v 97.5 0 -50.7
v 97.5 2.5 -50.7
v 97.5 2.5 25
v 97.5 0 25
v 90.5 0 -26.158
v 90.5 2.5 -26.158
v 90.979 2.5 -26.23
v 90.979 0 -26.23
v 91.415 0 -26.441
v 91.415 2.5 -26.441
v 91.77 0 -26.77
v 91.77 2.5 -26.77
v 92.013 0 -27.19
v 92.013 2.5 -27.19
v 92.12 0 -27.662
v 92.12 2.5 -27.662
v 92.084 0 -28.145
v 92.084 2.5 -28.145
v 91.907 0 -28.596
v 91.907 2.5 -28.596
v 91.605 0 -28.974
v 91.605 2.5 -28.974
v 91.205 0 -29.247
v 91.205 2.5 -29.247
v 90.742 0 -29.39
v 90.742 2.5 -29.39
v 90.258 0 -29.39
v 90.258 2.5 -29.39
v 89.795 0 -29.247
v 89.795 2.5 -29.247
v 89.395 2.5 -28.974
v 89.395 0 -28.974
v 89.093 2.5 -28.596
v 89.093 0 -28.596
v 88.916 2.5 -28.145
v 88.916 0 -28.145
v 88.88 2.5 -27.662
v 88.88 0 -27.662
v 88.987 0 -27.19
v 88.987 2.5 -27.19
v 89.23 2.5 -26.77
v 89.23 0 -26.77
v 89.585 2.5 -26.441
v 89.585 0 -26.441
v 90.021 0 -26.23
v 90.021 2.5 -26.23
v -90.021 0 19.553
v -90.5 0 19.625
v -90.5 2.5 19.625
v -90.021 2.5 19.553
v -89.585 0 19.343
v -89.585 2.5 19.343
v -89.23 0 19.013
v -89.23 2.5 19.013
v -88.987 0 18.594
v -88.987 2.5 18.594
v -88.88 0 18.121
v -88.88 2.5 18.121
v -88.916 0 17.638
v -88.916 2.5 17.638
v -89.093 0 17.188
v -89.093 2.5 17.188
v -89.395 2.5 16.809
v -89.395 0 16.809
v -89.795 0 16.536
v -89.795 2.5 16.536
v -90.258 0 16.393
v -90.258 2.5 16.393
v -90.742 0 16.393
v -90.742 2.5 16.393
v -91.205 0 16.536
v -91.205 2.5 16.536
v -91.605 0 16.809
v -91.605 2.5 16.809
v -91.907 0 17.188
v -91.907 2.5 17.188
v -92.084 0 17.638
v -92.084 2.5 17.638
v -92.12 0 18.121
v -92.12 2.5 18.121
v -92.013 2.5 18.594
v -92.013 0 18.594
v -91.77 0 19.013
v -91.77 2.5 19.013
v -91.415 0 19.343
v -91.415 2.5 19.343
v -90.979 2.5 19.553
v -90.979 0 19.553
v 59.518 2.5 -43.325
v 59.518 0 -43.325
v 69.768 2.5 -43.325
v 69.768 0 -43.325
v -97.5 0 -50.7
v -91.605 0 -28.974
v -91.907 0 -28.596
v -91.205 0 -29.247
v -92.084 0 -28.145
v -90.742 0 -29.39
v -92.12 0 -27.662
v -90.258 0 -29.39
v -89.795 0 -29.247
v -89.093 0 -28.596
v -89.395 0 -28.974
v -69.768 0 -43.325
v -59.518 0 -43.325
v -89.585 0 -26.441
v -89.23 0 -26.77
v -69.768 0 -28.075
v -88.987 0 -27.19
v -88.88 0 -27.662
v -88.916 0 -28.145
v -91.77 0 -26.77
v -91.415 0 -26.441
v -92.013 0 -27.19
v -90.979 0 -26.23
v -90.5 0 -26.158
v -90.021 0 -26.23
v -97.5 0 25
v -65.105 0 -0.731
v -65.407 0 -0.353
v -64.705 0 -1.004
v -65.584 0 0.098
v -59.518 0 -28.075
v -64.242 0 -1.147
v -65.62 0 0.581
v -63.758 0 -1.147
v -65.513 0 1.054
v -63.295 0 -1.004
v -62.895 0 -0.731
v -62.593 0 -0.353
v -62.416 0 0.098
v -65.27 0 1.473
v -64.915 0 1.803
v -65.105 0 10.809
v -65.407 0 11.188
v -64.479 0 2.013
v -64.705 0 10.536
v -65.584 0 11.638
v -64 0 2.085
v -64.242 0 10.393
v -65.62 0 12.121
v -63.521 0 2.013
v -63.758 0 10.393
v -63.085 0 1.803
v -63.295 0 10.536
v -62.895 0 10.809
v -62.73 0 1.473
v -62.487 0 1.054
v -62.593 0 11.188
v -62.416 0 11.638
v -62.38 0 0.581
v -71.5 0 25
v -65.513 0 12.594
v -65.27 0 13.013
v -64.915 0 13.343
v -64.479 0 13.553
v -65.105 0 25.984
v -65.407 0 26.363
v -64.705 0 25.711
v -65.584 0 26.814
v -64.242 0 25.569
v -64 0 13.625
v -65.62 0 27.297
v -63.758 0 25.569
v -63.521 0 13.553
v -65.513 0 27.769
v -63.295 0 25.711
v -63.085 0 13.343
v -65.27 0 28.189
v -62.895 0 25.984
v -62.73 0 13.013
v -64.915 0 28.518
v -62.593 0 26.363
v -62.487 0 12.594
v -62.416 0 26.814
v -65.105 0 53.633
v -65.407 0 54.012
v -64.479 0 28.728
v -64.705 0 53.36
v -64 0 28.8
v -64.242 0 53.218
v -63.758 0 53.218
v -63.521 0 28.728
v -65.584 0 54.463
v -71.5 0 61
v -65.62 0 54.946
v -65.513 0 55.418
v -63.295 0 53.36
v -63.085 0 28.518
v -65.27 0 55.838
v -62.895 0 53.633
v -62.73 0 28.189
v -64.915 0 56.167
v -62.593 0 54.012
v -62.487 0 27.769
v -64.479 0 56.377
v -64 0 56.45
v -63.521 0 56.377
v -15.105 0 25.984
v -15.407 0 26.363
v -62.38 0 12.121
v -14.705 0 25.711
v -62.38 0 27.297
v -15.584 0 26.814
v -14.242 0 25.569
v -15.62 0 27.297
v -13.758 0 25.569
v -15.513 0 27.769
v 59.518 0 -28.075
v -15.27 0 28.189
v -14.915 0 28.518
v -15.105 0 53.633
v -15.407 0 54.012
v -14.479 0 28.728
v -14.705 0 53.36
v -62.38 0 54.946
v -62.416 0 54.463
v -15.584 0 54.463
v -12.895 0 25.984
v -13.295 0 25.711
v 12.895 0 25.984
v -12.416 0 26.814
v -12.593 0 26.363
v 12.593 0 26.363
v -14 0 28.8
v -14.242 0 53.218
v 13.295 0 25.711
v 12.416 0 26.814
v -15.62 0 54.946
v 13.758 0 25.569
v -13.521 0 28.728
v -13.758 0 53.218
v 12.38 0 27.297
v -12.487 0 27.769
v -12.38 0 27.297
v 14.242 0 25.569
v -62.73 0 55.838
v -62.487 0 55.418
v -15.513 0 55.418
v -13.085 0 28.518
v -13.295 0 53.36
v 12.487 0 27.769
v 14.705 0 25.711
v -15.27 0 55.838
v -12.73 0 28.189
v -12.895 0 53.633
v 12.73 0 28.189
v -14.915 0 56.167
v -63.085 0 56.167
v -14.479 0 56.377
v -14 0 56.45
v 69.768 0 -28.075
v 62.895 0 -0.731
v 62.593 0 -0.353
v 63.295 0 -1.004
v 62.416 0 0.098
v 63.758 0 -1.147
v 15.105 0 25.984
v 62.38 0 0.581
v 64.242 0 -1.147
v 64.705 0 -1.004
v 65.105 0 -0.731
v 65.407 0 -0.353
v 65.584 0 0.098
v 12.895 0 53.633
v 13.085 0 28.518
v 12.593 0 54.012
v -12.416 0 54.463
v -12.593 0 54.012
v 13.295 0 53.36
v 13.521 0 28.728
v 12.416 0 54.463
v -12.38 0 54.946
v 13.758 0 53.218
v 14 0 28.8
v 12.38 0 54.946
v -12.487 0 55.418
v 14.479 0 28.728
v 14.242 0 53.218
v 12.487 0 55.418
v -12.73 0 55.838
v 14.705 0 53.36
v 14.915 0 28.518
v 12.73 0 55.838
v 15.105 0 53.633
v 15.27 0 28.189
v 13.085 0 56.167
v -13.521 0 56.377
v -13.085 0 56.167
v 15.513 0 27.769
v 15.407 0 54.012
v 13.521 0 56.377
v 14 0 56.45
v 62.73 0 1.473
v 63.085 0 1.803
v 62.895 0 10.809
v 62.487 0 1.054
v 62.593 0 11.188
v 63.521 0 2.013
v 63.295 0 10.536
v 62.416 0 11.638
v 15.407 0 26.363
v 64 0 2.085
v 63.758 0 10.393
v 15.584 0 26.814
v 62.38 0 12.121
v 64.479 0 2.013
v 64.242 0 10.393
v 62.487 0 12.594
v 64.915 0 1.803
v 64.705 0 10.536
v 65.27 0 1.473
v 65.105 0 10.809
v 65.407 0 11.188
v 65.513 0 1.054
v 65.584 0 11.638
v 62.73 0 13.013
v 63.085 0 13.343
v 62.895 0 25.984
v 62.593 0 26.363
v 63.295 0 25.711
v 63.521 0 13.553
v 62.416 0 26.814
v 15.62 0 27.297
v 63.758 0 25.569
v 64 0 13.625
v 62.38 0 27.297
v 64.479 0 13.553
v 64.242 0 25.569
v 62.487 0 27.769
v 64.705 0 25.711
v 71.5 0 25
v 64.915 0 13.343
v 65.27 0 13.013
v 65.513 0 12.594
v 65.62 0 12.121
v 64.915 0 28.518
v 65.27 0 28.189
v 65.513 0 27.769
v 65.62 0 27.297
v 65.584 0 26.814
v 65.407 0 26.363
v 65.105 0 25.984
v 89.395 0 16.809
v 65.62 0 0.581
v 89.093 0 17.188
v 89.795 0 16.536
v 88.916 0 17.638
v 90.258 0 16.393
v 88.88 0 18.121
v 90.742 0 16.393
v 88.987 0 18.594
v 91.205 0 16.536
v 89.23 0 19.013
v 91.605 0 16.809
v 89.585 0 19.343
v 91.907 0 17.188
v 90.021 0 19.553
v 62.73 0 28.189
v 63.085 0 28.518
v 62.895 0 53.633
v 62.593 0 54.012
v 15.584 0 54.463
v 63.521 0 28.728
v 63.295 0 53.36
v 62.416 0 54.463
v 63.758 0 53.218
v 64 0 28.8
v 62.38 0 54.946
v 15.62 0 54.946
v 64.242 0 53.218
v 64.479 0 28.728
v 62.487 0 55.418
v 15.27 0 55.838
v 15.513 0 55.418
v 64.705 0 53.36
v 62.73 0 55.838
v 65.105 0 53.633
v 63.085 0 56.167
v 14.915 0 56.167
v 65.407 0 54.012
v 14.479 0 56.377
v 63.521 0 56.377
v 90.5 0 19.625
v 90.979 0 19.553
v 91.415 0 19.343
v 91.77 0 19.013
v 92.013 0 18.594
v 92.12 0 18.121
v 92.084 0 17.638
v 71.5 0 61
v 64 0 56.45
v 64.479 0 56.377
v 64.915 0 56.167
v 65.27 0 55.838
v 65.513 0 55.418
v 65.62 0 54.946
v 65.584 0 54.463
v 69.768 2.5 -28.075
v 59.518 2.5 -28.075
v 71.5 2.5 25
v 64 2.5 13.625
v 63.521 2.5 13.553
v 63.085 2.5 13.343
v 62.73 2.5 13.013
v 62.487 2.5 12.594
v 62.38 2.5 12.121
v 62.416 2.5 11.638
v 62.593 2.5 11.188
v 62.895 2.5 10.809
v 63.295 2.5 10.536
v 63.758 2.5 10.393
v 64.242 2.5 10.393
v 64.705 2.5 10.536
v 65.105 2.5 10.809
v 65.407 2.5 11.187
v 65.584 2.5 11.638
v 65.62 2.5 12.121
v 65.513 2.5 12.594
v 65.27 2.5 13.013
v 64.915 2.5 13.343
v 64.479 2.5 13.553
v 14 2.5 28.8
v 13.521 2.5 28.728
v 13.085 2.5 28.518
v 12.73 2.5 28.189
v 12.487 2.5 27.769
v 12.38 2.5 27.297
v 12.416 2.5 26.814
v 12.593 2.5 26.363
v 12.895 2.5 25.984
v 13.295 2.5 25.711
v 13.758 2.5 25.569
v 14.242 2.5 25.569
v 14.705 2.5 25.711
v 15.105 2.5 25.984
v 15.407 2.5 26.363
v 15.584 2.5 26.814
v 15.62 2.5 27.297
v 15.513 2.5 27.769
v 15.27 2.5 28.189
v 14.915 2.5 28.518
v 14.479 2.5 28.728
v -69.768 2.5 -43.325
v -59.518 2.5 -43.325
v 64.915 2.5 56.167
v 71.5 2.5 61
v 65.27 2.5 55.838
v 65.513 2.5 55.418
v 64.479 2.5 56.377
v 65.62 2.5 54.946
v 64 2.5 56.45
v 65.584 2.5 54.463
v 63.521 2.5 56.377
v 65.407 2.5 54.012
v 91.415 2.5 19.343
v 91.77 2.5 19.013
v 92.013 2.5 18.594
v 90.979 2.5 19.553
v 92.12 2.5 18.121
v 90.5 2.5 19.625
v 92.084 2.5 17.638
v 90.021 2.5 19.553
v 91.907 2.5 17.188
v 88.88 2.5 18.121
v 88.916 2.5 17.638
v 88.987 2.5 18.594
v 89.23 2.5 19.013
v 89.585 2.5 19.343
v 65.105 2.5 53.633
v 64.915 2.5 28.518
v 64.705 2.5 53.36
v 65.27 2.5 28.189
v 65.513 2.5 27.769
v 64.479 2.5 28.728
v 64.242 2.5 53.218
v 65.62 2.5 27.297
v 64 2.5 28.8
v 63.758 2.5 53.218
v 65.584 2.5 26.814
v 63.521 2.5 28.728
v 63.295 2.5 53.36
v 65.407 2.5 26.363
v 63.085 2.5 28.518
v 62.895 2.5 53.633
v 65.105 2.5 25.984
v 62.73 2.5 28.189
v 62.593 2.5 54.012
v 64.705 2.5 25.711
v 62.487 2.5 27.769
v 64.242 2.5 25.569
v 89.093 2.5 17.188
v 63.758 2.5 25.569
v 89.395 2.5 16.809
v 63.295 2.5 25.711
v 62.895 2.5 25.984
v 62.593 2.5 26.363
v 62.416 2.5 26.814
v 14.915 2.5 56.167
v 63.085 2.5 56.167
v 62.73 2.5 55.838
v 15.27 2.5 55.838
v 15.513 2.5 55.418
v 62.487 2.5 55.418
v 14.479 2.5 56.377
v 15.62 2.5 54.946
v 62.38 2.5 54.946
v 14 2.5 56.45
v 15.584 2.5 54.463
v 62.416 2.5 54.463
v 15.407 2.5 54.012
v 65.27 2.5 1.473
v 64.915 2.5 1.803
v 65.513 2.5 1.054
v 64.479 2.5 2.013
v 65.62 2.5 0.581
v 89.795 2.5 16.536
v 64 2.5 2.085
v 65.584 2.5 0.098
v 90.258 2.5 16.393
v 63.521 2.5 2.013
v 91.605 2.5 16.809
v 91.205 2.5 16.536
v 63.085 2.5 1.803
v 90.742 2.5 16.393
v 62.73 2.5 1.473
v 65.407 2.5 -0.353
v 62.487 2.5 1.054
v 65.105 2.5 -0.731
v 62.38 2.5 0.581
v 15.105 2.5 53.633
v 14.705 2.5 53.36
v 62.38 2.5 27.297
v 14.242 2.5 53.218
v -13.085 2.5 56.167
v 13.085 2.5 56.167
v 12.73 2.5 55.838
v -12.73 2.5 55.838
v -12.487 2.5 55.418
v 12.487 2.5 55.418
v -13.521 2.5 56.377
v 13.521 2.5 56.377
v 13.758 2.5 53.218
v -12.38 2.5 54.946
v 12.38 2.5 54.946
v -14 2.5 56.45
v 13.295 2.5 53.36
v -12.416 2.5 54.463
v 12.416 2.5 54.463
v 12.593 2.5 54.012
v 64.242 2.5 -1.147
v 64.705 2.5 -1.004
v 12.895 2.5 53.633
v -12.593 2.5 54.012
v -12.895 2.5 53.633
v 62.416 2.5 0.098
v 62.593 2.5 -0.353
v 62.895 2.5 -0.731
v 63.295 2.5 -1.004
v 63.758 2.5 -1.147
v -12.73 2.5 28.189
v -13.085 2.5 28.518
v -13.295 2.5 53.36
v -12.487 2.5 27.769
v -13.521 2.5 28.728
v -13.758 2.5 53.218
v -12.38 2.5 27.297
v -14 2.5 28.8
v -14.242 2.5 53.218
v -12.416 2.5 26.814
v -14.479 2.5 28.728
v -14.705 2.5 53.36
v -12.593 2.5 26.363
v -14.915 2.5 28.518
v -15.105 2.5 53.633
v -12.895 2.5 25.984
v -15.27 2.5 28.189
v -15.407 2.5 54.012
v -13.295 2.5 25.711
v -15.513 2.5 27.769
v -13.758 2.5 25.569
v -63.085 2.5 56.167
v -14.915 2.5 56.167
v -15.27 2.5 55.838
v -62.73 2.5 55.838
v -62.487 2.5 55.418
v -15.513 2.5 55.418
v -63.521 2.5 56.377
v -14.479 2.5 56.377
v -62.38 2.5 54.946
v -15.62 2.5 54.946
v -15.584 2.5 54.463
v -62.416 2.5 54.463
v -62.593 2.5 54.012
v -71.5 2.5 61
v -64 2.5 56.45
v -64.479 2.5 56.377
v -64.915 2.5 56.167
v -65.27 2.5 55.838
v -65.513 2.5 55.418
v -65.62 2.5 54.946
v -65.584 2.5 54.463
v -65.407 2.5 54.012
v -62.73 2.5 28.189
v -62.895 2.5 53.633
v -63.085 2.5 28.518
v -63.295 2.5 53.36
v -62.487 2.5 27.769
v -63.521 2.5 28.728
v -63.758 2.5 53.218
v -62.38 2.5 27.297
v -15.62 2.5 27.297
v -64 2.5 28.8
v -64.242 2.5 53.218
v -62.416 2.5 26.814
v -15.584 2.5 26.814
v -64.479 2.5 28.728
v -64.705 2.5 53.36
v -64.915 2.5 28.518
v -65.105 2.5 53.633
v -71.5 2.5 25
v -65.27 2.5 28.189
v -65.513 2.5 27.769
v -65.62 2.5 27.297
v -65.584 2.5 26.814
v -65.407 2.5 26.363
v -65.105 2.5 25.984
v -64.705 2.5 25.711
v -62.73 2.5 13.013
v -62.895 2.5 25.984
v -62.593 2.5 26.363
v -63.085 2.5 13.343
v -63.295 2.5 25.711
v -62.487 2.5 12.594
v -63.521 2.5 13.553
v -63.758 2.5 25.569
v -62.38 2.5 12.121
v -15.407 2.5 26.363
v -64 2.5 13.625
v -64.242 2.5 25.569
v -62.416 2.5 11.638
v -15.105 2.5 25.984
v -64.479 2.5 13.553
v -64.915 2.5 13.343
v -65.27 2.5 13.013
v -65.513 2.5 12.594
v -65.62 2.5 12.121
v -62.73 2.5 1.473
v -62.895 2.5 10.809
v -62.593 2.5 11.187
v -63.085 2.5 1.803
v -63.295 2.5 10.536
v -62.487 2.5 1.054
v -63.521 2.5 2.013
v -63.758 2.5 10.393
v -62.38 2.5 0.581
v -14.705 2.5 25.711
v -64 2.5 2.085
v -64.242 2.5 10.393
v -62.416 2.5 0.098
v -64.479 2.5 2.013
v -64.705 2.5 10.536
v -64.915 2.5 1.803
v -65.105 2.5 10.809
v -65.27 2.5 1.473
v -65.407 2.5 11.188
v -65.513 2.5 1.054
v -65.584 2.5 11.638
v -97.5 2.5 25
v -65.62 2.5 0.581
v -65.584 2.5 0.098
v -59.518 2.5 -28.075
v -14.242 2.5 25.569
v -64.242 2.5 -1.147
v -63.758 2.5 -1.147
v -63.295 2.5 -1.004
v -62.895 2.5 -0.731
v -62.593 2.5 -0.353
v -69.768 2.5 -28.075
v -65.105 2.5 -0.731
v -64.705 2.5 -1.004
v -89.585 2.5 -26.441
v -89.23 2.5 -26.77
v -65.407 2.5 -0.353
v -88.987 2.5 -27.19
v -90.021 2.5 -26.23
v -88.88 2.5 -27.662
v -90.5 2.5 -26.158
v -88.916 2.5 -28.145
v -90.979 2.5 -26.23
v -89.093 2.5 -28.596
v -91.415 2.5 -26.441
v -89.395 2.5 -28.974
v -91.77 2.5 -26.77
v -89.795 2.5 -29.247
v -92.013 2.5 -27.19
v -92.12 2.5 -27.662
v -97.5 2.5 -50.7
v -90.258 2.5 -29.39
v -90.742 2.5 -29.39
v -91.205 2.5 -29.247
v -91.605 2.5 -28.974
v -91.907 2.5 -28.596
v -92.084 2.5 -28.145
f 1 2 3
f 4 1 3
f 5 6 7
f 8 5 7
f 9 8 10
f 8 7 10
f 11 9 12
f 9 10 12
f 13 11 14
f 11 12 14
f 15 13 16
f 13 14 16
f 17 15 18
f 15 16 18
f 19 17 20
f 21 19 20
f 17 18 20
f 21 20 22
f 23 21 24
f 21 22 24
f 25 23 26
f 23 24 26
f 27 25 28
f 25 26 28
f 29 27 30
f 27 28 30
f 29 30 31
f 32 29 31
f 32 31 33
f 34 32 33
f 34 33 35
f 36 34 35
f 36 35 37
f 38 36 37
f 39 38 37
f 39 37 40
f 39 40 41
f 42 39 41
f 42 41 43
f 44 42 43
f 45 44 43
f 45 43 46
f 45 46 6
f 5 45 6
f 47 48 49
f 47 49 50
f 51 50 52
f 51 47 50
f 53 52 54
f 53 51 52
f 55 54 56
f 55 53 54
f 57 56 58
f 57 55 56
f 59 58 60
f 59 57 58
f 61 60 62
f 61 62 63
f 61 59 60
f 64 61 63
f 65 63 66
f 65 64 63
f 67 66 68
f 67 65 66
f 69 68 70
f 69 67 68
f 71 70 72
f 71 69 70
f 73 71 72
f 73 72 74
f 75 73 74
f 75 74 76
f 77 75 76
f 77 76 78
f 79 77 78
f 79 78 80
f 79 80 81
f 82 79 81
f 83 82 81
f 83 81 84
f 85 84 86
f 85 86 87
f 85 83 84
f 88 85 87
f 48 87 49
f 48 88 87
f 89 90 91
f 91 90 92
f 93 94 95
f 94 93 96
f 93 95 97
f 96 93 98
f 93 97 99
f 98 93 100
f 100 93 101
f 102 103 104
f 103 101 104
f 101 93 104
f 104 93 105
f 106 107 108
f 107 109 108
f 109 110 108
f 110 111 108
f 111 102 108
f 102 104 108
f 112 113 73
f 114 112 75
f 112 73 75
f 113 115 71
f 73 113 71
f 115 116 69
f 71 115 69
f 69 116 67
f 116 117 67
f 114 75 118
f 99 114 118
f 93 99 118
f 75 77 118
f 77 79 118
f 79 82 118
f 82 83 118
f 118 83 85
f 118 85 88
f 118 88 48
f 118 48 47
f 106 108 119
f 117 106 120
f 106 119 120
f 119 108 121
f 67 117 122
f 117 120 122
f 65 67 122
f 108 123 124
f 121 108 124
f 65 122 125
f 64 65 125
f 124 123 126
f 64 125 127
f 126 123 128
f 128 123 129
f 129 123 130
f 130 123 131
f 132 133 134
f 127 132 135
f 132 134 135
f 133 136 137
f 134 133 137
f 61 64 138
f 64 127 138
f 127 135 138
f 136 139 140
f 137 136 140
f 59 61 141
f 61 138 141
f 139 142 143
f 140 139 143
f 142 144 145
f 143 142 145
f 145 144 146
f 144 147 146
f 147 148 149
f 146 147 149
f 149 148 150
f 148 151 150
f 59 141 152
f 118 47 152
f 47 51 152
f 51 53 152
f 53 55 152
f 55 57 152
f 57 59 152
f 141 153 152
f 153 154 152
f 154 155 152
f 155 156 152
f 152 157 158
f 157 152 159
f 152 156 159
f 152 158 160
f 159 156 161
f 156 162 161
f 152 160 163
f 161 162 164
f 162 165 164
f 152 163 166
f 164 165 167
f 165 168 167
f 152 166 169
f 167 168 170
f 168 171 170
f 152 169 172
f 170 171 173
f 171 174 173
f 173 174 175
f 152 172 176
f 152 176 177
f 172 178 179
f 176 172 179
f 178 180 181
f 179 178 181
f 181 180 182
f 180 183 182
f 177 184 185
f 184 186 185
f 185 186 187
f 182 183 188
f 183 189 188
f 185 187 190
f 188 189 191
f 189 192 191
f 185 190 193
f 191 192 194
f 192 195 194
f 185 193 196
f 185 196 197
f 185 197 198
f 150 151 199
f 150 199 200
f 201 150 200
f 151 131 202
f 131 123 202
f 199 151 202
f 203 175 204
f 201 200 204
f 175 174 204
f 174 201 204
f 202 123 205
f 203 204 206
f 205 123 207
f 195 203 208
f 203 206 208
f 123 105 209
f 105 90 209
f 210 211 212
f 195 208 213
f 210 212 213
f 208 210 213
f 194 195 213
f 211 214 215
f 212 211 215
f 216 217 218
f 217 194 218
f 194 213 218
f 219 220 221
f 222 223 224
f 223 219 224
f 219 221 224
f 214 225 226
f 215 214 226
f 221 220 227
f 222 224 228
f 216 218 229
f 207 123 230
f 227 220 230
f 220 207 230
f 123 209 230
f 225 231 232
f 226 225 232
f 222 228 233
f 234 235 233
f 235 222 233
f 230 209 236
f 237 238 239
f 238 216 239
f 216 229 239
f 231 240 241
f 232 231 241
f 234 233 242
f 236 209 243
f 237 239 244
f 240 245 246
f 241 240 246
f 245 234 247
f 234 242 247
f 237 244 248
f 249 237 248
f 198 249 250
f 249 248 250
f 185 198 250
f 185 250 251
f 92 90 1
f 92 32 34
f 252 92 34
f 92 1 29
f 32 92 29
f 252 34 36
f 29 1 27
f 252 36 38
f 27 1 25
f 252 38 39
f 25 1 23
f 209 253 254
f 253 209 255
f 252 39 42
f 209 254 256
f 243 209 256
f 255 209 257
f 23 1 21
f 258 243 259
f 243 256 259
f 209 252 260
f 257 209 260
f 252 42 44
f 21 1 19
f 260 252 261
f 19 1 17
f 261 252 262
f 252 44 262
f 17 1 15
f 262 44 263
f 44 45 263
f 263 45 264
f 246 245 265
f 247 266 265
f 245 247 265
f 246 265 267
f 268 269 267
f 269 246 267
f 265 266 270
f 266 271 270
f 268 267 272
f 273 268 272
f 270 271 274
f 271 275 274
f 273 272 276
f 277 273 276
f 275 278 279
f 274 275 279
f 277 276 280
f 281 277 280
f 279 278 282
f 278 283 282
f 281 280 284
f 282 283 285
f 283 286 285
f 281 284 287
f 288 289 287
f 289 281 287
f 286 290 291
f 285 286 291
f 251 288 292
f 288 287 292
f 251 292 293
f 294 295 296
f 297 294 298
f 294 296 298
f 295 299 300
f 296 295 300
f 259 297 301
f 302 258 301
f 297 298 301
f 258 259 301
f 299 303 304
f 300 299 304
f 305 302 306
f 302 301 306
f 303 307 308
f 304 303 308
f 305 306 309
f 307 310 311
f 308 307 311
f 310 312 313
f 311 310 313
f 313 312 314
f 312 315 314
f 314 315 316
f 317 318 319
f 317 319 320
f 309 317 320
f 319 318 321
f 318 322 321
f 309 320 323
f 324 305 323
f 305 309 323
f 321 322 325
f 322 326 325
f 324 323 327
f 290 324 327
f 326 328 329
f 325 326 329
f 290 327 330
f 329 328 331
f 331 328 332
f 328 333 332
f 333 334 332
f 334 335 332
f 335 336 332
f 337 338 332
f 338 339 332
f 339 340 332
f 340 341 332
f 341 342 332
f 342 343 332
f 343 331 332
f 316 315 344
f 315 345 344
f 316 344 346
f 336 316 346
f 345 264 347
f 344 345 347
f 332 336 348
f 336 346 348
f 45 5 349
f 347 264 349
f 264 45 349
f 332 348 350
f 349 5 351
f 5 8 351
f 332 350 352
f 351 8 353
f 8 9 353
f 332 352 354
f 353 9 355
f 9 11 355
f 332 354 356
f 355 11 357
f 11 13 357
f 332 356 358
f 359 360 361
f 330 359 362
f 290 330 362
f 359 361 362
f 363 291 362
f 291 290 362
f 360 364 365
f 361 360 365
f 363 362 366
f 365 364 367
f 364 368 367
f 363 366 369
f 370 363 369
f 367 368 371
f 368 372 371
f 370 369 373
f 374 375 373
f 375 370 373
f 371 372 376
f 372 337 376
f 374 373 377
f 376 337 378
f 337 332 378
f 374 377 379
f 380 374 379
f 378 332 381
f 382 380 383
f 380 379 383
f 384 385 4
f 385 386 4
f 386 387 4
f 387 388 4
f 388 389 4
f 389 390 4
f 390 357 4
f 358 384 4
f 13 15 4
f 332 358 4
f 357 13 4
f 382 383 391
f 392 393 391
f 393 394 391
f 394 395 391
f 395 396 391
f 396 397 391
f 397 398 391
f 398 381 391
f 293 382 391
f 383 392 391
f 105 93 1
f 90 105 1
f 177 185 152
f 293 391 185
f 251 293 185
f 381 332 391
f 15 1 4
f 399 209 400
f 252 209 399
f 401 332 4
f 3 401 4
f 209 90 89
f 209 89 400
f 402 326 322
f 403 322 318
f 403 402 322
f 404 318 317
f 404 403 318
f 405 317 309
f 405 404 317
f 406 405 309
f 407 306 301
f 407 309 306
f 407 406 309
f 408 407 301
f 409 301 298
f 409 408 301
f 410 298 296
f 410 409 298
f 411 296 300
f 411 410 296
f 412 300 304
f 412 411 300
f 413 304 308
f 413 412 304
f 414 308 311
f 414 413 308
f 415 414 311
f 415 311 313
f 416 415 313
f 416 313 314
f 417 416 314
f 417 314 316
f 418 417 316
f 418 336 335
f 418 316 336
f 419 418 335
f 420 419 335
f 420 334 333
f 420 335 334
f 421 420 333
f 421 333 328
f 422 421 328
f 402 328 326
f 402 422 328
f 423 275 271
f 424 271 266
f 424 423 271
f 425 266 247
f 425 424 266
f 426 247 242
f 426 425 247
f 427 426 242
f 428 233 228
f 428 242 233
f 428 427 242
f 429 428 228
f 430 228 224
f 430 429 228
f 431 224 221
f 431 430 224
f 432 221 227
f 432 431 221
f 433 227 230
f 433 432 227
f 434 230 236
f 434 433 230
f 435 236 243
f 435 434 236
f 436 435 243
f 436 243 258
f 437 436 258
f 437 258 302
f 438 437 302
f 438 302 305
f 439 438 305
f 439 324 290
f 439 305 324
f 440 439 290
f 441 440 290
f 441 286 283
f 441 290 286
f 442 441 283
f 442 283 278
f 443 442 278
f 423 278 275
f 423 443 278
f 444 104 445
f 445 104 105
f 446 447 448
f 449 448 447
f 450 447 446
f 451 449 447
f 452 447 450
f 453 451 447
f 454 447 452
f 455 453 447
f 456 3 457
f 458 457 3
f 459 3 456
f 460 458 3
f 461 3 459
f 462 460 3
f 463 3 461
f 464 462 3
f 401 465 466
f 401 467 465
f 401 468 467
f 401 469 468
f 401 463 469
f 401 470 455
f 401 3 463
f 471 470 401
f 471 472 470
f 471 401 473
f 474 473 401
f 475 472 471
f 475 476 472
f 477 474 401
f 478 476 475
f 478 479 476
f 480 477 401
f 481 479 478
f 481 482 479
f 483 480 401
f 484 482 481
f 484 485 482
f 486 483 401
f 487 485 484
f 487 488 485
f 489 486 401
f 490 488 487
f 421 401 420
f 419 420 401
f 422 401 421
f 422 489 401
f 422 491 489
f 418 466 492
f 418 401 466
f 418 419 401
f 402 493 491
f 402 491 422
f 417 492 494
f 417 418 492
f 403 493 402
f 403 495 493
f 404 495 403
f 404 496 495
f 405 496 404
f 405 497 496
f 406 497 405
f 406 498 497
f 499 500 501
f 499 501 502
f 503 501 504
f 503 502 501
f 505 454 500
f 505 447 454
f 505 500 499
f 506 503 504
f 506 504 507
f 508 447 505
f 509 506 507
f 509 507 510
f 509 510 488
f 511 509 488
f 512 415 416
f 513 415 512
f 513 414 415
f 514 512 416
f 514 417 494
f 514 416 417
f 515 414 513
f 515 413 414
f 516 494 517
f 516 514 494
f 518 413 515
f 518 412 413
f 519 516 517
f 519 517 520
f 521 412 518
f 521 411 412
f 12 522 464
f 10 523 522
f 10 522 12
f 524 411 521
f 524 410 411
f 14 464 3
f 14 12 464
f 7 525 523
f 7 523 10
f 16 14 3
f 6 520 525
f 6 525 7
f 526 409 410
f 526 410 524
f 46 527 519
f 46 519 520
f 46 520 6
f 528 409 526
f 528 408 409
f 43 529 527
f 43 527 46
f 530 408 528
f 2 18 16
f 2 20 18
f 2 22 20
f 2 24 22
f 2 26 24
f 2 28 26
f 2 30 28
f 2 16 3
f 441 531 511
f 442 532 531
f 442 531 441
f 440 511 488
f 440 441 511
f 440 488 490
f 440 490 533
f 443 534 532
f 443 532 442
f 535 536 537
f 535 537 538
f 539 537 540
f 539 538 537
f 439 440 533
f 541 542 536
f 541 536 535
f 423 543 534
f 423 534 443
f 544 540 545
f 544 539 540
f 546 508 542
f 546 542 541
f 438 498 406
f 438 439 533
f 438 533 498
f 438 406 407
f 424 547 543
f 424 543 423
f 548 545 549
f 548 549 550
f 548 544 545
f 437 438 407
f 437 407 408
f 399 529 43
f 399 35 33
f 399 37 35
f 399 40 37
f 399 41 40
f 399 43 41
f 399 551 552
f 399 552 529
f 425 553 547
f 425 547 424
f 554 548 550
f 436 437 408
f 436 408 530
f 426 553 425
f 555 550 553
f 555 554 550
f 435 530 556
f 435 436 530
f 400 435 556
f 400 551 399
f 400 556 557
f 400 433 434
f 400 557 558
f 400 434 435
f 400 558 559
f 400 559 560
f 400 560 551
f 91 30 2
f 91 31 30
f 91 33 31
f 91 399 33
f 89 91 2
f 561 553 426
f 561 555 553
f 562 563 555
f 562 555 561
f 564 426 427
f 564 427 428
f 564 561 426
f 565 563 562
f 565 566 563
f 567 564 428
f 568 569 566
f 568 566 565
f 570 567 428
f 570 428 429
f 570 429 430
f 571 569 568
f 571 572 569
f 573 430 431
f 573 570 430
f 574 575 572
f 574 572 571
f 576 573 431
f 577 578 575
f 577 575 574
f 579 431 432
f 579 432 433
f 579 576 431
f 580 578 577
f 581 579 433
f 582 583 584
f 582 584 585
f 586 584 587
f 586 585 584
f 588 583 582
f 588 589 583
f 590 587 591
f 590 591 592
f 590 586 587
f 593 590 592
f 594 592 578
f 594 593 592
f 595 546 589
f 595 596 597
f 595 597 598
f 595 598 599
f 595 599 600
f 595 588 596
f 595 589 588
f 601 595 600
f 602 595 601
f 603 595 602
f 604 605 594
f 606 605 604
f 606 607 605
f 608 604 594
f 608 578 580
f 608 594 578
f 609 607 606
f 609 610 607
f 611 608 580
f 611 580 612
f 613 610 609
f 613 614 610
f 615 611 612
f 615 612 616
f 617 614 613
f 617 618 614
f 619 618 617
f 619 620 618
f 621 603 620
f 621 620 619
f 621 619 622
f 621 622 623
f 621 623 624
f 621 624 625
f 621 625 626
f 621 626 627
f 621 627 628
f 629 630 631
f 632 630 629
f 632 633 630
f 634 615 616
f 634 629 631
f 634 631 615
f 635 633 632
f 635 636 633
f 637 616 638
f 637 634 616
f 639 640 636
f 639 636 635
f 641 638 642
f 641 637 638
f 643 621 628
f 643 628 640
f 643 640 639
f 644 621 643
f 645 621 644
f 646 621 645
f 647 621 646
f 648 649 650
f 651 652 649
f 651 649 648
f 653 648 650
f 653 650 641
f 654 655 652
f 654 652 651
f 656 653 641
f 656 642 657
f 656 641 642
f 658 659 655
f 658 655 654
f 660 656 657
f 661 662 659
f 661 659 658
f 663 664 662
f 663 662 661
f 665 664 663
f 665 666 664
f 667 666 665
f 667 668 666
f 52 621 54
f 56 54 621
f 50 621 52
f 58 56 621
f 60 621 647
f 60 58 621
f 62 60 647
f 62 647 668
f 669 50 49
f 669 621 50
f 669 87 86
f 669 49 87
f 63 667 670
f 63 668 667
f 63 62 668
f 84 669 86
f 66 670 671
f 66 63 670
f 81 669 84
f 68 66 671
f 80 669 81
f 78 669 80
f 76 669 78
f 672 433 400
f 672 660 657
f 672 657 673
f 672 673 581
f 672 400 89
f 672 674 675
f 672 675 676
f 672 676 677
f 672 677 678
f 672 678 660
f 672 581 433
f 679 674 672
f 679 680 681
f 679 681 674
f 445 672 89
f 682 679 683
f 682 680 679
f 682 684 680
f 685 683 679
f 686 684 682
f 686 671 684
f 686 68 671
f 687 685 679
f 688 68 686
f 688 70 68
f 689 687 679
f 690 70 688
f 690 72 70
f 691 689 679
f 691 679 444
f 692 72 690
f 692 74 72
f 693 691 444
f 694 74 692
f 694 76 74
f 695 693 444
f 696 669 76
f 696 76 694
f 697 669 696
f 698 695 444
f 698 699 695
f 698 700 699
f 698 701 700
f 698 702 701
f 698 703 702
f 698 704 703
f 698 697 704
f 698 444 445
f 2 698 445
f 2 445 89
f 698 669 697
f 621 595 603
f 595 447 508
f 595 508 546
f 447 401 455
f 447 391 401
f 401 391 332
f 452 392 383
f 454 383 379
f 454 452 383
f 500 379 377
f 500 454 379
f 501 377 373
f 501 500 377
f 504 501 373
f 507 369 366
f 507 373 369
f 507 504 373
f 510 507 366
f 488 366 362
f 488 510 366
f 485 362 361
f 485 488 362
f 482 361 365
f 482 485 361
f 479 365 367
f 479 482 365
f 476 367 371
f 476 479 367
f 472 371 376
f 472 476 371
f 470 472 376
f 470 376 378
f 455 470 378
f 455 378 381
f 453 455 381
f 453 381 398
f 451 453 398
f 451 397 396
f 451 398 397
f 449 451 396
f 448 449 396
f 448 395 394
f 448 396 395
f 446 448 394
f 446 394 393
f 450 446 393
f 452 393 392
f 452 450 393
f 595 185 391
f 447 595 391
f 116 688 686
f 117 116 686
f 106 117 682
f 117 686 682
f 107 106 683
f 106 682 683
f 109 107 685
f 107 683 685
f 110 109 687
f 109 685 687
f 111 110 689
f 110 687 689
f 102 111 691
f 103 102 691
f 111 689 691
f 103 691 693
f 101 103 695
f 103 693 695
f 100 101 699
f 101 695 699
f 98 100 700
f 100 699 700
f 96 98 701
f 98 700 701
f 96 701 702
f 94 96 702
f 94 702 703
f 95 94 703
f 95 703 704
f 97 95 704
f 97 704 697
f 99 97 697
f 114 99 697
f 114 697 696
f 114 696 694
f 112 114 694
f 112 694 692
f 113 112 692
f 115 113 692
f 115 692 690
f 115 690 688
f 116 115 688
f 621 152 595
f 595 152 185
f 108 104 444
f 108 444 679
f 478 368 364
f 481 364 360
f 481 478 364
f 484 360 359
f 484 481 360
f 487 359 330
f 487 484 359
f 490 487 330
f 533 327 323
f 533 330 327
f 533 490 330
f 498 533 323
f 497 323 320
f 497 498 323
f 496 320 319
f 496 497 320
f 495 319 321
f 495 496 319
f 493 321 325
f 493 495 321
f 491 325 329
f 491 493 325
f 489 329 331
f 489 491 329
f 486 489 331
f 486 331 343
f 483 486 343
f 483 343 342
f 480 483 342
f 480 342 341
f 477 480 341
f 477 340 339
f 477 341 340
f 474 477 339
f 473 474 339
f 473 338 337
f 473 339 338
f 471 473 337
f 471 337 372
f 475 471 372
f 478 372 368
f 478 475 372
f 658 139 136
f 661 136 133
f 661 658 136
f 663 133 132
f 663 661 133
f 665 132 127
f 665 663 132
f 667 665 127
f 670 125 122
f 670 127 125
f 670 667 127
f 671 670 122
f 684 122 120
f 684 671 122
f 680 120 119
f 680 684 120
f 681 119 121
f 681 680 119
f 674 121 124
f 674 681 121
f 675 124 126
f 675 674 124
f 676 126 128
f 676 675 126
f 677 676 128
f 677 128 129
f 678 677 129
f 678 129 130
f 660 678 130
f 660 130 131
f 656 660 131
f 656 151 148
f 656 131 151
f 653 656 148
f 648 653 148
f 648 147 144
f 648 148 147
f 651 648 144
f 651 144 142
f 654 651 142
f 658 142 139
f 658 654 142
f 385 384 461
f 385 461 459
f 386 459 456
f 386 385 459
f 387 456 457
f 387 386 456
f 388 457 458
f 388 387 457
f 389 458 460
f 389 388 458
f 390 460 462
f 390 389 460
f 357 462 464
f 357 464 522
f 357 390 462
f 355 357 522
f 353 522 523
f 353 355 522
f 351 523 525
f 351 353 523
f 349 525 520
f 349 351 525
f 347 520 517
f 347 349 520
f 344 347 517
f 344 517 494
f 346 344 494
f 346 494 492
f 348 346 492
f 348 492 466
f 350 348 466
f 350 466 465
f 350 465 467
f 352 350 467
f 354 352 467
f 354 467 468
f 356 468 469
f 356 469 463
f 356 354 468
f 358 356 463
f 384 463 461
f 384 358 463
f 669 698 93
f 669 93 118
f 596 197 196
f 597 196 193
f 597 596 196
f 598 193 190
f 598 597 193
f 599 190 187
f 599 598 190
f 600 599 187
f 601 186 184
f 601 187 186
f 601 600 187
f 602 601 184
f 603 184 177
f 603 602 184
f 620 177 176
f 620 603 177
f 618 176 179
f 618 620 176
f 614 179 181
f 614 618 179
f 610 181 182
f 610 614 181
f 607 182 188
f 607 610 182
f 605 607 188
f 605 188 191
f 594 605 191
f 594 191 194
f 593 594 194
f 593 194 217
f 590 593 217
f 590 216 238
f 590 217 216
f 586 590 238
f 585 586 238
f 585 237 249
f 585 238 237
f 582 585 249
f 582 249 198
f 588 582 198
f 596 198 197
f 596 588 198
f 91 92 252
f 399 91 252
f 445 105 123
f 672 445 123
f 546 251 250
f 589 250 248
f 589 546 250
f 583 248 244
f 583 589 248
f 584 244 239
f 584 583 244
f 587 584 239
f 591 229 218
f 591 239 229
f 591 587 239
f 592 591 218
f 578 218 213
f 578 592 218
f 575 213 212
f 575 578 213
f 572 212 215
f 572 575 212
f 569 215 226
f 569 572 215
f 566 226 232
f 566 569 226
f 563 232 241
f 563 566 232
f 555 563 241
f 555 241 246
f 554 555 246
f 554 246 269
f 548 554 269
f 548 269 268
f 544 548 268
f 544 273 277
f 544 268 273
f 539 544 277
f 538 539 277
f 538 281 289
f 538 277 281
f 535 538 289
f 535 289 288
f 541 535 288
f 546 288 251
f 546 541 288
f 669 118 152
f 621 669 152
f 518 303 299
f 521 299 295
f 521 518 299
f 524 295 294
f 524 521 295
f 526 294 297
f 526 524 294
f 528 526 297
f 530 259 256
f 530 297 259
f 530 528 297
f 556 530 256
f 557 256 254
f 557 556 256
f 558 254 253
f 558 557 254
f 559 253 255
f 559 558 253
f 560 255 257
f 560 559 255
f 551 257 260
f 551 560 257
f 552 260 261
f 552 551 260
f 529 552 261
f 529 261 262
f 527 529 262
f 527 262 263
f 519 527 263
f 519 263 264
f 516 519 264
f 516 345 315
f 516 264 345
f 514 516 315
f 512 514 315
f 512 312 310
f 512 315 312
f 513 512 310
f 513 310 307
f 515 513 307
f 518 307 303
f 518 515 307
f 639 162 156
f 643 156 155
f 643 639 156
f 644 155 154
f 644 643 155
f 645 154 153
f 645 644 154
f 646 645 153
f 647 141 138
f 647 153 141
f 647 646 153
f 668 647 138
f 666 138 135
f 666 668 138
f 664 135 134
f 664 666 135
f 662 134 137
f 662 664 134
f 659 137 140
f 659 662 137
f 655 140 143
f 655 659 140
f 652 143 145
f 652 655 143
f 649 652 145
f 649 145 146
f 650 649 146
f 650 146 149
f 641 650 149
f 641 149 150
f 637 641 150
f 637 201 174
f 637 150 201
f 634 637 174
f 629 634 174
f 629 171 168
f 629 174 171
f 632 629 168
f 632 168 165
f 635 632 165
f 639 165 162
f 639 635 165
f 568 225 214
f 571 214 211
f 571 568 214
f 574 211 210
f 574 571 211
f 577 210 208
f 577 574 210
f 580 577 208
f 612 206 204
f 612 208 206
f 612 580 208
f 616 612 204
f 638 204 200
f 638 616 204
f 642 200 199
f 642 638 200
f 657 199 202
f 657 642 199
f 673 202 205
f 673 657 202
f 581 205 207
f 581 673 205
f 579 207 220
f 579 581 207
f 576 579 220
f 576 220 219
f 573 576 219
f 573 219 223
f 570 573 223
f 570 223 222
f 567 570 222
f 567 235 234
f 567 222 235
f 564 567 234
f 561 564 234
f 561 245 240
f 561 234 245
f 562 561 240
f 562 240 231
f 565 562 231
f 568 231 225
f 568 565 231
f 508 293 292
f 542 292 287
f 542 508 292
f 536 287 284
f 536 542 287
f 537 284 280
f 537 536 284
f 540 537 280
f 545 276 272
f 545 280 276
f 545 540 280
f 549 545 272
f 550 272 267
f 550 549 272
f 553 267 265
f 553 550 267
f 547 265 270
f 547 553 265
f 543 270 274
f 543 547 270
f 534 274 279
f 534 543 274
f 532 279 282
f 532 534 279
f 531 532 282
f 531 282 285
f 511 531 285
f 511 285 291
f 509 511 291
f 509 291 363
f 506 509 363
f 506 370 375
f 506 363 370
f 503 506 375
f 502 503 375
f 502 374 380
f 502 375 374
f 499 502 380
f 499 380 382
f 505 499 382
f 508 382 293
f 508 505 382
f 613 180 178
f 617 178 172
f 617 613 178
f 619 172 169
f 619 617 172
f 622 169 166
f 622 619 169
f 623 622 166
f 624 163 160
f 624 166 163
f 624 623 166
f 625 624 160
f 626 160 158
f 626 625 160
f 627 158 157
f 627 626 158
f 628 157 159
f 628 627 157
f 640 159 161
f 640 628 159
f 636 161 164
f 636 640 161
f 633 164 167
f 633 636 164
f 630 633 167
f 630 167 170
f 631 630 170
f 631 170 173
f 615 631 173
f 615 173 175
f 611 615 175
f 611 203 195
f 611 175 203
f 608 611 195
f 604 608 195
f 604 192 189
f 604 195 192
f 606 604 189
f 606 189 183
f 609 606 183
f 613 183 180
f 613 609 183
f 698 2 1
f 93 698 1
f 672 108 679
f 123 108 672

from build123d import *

# Parameters (mm, degrees)
CROQUIS1_R              = 1.625
CUERPO_INICIAL_DEPTH    = 2.5
SALIENTE_EXTRUIR2_DEPTH = 195
CROQUIS7_R              = 1.625
CORTAR_EXTRUIR2_DEPTH   = 10
CROQUIS10_R             = 1.625
CORTAR_EXTRUIR7_DEPTH   = 10
CROQUIS11_W             = 10.25
CROQUIS11_H             = 15.25
CORTAR_EXTRUIR8_DEPTH   = 10
SALIENTE_EXTRUIR3_DEPTH = 195


with BuildPart() as part:
    # Croquis1 → Cuerpo Inicial (new body)
    with BuildSketch(Plane(origin=(0, 0, 0), x_dir=(1, 0, 0), z_dir=(0, 1, 0))):
        Polygon((-71.5, -25), (-71.5, -61), (71.5, -61), (71.5, -25), (97.5, -25), (97.5, 0), (97.5, 1), (97.5, 5.7), (45, 5.7), (-45, 5.7), (-97.5, 5.7), (-97.5, 1), (-97.5, 0), (-97.5, -25), align=None)
        with Locations(Location((-90.5, -18, 0), (0, 0, 270))):
            Circle(CROQUIS1_R, mode=Mode.SUBTRACT)
        with Locations(Location((90.5, -18, 0), (0, 0, 270))):
            Circle(CROQUIS1_R, mode=Mode.SUBTRACT)
    extrude(amount=CUERPO_INICIAL_DEPTH)

    # Croquis3 → Saliente-Extruir2 (add)
    with BuildSketch(Plane(origin=(97.5, 0, 0), x_dir=(0, 0, -1), z_dir=(1, 0, 0))):
        Polygon((5.7, 2.5), (47.783199952, 2.5), (50.7, 0), (5.7, 0), align=None)
    extrude(amount=-SALIENTE_EXTRUIR2_DEPTH)

    # Croquis7 → Cortar-Extruir2 (cut)
    with BuildSketch(Plane(origin=(0, 2.5, 0), x_dir=(1, 0, 0), z_dir=(0, 1, 0))):
        with Locations(Location((90.5, 27.783199952, 0), (0, 0, 270))):
            Circle(CROQUIS7_R)
        with Locations(Location((-90.5, 27.783199952, 0), (0, 0, 270))):
            Circle(CROQUIS7_R)
    extrude(amount=-CORTAR_EXTRUIR2_DEPTH, mode=Mode.SUBTRACT)

    # Croquis10 → Cortar-Extruir7 (cut)
    with BuildSketch(Plane(origin=(0, 2.5, -2.5), x_dir=(1, 0, 0), z_dir=(0, -1, 0))):
        with Locations(Location((64, 2.96, 0), (0, 0, 90))):
            Circle(CROQUIS10_R)
        with Locations(Location((64, 14.5, 0), (0, 0, 90))):
            Circle(CROQUIS10_R)
        with Locations(Location((-64, 2.96, 0), (0, 0, 90))):
            Circle(CROQUIS10_R)
        with Locations(Location((-64, 14.5, 0), (0, 0, 90))):
            Circle(CROQUIS10_R)
        with Locations(Location((64, 29.6754, 0), (0, 0, 90))):
            Circle(CROQUIS10_R)
        with Locations(Location((64, 57.3245, 0), (0, 0, 90))):
            Circle(CROQUIS10_R)
        with Locations(Location((-64, 57.3245, 0), (0, 0, 90))):
            Circle(CROQUIS10_R)
        with Locations(Location((-64, 29.6754, 0), (0, 0, 90))):
            Circle(CROQUIS10_R)
        with Locations(Location((14, 29.6754, 0), (0, 0, 90))):
            Circle(CROQUIS10_R)
        with Locations(Location((14, 57.3245, 0), (0, 0, 90))):
            Circle(CROQUIS10_R)
        with Locations(Location((-14, 57.3245, 0), (0, 0, 90))):
            Circle(CROQUIS10_R)
        with Locations(Location((-14, 29.6754, 0), (0, 0, 90))):
            Circle(CROQUIS10_R)
    extrude(amount=CORTAR_EXTRUIR7_DEPTH, mode=Mode.SUBTRACT)

    # Croquis11 → Cortar-Extruir8 (cut)
    with BuildSketch(Plane.XZ):
        with Locations((-64.64307361, -35.7)):
            Rectangle(CROQUIS11_W, CROQUIS11_H)
        with Locations((64.64307361, -35.7)):
            Rectangle(CROQUIS11_W, CROQUIS11_H)
    extrude(amount=-CORTAR_EXTRUIR8_DEPTH, mode=Mode.SUBTRACT)

    # Croquis12 → Saliente-Extruir3 (add)
    with BuildSketch(Plane.ZY.offset(97.5)):
        Polygon((-50.7, 0), (-47.783199952, 2.5), (-50.7, 2.5), align=None)
    extrude(amount=-SALIENTE_EXTRUIR3_DEPTH)


solid = part.part
